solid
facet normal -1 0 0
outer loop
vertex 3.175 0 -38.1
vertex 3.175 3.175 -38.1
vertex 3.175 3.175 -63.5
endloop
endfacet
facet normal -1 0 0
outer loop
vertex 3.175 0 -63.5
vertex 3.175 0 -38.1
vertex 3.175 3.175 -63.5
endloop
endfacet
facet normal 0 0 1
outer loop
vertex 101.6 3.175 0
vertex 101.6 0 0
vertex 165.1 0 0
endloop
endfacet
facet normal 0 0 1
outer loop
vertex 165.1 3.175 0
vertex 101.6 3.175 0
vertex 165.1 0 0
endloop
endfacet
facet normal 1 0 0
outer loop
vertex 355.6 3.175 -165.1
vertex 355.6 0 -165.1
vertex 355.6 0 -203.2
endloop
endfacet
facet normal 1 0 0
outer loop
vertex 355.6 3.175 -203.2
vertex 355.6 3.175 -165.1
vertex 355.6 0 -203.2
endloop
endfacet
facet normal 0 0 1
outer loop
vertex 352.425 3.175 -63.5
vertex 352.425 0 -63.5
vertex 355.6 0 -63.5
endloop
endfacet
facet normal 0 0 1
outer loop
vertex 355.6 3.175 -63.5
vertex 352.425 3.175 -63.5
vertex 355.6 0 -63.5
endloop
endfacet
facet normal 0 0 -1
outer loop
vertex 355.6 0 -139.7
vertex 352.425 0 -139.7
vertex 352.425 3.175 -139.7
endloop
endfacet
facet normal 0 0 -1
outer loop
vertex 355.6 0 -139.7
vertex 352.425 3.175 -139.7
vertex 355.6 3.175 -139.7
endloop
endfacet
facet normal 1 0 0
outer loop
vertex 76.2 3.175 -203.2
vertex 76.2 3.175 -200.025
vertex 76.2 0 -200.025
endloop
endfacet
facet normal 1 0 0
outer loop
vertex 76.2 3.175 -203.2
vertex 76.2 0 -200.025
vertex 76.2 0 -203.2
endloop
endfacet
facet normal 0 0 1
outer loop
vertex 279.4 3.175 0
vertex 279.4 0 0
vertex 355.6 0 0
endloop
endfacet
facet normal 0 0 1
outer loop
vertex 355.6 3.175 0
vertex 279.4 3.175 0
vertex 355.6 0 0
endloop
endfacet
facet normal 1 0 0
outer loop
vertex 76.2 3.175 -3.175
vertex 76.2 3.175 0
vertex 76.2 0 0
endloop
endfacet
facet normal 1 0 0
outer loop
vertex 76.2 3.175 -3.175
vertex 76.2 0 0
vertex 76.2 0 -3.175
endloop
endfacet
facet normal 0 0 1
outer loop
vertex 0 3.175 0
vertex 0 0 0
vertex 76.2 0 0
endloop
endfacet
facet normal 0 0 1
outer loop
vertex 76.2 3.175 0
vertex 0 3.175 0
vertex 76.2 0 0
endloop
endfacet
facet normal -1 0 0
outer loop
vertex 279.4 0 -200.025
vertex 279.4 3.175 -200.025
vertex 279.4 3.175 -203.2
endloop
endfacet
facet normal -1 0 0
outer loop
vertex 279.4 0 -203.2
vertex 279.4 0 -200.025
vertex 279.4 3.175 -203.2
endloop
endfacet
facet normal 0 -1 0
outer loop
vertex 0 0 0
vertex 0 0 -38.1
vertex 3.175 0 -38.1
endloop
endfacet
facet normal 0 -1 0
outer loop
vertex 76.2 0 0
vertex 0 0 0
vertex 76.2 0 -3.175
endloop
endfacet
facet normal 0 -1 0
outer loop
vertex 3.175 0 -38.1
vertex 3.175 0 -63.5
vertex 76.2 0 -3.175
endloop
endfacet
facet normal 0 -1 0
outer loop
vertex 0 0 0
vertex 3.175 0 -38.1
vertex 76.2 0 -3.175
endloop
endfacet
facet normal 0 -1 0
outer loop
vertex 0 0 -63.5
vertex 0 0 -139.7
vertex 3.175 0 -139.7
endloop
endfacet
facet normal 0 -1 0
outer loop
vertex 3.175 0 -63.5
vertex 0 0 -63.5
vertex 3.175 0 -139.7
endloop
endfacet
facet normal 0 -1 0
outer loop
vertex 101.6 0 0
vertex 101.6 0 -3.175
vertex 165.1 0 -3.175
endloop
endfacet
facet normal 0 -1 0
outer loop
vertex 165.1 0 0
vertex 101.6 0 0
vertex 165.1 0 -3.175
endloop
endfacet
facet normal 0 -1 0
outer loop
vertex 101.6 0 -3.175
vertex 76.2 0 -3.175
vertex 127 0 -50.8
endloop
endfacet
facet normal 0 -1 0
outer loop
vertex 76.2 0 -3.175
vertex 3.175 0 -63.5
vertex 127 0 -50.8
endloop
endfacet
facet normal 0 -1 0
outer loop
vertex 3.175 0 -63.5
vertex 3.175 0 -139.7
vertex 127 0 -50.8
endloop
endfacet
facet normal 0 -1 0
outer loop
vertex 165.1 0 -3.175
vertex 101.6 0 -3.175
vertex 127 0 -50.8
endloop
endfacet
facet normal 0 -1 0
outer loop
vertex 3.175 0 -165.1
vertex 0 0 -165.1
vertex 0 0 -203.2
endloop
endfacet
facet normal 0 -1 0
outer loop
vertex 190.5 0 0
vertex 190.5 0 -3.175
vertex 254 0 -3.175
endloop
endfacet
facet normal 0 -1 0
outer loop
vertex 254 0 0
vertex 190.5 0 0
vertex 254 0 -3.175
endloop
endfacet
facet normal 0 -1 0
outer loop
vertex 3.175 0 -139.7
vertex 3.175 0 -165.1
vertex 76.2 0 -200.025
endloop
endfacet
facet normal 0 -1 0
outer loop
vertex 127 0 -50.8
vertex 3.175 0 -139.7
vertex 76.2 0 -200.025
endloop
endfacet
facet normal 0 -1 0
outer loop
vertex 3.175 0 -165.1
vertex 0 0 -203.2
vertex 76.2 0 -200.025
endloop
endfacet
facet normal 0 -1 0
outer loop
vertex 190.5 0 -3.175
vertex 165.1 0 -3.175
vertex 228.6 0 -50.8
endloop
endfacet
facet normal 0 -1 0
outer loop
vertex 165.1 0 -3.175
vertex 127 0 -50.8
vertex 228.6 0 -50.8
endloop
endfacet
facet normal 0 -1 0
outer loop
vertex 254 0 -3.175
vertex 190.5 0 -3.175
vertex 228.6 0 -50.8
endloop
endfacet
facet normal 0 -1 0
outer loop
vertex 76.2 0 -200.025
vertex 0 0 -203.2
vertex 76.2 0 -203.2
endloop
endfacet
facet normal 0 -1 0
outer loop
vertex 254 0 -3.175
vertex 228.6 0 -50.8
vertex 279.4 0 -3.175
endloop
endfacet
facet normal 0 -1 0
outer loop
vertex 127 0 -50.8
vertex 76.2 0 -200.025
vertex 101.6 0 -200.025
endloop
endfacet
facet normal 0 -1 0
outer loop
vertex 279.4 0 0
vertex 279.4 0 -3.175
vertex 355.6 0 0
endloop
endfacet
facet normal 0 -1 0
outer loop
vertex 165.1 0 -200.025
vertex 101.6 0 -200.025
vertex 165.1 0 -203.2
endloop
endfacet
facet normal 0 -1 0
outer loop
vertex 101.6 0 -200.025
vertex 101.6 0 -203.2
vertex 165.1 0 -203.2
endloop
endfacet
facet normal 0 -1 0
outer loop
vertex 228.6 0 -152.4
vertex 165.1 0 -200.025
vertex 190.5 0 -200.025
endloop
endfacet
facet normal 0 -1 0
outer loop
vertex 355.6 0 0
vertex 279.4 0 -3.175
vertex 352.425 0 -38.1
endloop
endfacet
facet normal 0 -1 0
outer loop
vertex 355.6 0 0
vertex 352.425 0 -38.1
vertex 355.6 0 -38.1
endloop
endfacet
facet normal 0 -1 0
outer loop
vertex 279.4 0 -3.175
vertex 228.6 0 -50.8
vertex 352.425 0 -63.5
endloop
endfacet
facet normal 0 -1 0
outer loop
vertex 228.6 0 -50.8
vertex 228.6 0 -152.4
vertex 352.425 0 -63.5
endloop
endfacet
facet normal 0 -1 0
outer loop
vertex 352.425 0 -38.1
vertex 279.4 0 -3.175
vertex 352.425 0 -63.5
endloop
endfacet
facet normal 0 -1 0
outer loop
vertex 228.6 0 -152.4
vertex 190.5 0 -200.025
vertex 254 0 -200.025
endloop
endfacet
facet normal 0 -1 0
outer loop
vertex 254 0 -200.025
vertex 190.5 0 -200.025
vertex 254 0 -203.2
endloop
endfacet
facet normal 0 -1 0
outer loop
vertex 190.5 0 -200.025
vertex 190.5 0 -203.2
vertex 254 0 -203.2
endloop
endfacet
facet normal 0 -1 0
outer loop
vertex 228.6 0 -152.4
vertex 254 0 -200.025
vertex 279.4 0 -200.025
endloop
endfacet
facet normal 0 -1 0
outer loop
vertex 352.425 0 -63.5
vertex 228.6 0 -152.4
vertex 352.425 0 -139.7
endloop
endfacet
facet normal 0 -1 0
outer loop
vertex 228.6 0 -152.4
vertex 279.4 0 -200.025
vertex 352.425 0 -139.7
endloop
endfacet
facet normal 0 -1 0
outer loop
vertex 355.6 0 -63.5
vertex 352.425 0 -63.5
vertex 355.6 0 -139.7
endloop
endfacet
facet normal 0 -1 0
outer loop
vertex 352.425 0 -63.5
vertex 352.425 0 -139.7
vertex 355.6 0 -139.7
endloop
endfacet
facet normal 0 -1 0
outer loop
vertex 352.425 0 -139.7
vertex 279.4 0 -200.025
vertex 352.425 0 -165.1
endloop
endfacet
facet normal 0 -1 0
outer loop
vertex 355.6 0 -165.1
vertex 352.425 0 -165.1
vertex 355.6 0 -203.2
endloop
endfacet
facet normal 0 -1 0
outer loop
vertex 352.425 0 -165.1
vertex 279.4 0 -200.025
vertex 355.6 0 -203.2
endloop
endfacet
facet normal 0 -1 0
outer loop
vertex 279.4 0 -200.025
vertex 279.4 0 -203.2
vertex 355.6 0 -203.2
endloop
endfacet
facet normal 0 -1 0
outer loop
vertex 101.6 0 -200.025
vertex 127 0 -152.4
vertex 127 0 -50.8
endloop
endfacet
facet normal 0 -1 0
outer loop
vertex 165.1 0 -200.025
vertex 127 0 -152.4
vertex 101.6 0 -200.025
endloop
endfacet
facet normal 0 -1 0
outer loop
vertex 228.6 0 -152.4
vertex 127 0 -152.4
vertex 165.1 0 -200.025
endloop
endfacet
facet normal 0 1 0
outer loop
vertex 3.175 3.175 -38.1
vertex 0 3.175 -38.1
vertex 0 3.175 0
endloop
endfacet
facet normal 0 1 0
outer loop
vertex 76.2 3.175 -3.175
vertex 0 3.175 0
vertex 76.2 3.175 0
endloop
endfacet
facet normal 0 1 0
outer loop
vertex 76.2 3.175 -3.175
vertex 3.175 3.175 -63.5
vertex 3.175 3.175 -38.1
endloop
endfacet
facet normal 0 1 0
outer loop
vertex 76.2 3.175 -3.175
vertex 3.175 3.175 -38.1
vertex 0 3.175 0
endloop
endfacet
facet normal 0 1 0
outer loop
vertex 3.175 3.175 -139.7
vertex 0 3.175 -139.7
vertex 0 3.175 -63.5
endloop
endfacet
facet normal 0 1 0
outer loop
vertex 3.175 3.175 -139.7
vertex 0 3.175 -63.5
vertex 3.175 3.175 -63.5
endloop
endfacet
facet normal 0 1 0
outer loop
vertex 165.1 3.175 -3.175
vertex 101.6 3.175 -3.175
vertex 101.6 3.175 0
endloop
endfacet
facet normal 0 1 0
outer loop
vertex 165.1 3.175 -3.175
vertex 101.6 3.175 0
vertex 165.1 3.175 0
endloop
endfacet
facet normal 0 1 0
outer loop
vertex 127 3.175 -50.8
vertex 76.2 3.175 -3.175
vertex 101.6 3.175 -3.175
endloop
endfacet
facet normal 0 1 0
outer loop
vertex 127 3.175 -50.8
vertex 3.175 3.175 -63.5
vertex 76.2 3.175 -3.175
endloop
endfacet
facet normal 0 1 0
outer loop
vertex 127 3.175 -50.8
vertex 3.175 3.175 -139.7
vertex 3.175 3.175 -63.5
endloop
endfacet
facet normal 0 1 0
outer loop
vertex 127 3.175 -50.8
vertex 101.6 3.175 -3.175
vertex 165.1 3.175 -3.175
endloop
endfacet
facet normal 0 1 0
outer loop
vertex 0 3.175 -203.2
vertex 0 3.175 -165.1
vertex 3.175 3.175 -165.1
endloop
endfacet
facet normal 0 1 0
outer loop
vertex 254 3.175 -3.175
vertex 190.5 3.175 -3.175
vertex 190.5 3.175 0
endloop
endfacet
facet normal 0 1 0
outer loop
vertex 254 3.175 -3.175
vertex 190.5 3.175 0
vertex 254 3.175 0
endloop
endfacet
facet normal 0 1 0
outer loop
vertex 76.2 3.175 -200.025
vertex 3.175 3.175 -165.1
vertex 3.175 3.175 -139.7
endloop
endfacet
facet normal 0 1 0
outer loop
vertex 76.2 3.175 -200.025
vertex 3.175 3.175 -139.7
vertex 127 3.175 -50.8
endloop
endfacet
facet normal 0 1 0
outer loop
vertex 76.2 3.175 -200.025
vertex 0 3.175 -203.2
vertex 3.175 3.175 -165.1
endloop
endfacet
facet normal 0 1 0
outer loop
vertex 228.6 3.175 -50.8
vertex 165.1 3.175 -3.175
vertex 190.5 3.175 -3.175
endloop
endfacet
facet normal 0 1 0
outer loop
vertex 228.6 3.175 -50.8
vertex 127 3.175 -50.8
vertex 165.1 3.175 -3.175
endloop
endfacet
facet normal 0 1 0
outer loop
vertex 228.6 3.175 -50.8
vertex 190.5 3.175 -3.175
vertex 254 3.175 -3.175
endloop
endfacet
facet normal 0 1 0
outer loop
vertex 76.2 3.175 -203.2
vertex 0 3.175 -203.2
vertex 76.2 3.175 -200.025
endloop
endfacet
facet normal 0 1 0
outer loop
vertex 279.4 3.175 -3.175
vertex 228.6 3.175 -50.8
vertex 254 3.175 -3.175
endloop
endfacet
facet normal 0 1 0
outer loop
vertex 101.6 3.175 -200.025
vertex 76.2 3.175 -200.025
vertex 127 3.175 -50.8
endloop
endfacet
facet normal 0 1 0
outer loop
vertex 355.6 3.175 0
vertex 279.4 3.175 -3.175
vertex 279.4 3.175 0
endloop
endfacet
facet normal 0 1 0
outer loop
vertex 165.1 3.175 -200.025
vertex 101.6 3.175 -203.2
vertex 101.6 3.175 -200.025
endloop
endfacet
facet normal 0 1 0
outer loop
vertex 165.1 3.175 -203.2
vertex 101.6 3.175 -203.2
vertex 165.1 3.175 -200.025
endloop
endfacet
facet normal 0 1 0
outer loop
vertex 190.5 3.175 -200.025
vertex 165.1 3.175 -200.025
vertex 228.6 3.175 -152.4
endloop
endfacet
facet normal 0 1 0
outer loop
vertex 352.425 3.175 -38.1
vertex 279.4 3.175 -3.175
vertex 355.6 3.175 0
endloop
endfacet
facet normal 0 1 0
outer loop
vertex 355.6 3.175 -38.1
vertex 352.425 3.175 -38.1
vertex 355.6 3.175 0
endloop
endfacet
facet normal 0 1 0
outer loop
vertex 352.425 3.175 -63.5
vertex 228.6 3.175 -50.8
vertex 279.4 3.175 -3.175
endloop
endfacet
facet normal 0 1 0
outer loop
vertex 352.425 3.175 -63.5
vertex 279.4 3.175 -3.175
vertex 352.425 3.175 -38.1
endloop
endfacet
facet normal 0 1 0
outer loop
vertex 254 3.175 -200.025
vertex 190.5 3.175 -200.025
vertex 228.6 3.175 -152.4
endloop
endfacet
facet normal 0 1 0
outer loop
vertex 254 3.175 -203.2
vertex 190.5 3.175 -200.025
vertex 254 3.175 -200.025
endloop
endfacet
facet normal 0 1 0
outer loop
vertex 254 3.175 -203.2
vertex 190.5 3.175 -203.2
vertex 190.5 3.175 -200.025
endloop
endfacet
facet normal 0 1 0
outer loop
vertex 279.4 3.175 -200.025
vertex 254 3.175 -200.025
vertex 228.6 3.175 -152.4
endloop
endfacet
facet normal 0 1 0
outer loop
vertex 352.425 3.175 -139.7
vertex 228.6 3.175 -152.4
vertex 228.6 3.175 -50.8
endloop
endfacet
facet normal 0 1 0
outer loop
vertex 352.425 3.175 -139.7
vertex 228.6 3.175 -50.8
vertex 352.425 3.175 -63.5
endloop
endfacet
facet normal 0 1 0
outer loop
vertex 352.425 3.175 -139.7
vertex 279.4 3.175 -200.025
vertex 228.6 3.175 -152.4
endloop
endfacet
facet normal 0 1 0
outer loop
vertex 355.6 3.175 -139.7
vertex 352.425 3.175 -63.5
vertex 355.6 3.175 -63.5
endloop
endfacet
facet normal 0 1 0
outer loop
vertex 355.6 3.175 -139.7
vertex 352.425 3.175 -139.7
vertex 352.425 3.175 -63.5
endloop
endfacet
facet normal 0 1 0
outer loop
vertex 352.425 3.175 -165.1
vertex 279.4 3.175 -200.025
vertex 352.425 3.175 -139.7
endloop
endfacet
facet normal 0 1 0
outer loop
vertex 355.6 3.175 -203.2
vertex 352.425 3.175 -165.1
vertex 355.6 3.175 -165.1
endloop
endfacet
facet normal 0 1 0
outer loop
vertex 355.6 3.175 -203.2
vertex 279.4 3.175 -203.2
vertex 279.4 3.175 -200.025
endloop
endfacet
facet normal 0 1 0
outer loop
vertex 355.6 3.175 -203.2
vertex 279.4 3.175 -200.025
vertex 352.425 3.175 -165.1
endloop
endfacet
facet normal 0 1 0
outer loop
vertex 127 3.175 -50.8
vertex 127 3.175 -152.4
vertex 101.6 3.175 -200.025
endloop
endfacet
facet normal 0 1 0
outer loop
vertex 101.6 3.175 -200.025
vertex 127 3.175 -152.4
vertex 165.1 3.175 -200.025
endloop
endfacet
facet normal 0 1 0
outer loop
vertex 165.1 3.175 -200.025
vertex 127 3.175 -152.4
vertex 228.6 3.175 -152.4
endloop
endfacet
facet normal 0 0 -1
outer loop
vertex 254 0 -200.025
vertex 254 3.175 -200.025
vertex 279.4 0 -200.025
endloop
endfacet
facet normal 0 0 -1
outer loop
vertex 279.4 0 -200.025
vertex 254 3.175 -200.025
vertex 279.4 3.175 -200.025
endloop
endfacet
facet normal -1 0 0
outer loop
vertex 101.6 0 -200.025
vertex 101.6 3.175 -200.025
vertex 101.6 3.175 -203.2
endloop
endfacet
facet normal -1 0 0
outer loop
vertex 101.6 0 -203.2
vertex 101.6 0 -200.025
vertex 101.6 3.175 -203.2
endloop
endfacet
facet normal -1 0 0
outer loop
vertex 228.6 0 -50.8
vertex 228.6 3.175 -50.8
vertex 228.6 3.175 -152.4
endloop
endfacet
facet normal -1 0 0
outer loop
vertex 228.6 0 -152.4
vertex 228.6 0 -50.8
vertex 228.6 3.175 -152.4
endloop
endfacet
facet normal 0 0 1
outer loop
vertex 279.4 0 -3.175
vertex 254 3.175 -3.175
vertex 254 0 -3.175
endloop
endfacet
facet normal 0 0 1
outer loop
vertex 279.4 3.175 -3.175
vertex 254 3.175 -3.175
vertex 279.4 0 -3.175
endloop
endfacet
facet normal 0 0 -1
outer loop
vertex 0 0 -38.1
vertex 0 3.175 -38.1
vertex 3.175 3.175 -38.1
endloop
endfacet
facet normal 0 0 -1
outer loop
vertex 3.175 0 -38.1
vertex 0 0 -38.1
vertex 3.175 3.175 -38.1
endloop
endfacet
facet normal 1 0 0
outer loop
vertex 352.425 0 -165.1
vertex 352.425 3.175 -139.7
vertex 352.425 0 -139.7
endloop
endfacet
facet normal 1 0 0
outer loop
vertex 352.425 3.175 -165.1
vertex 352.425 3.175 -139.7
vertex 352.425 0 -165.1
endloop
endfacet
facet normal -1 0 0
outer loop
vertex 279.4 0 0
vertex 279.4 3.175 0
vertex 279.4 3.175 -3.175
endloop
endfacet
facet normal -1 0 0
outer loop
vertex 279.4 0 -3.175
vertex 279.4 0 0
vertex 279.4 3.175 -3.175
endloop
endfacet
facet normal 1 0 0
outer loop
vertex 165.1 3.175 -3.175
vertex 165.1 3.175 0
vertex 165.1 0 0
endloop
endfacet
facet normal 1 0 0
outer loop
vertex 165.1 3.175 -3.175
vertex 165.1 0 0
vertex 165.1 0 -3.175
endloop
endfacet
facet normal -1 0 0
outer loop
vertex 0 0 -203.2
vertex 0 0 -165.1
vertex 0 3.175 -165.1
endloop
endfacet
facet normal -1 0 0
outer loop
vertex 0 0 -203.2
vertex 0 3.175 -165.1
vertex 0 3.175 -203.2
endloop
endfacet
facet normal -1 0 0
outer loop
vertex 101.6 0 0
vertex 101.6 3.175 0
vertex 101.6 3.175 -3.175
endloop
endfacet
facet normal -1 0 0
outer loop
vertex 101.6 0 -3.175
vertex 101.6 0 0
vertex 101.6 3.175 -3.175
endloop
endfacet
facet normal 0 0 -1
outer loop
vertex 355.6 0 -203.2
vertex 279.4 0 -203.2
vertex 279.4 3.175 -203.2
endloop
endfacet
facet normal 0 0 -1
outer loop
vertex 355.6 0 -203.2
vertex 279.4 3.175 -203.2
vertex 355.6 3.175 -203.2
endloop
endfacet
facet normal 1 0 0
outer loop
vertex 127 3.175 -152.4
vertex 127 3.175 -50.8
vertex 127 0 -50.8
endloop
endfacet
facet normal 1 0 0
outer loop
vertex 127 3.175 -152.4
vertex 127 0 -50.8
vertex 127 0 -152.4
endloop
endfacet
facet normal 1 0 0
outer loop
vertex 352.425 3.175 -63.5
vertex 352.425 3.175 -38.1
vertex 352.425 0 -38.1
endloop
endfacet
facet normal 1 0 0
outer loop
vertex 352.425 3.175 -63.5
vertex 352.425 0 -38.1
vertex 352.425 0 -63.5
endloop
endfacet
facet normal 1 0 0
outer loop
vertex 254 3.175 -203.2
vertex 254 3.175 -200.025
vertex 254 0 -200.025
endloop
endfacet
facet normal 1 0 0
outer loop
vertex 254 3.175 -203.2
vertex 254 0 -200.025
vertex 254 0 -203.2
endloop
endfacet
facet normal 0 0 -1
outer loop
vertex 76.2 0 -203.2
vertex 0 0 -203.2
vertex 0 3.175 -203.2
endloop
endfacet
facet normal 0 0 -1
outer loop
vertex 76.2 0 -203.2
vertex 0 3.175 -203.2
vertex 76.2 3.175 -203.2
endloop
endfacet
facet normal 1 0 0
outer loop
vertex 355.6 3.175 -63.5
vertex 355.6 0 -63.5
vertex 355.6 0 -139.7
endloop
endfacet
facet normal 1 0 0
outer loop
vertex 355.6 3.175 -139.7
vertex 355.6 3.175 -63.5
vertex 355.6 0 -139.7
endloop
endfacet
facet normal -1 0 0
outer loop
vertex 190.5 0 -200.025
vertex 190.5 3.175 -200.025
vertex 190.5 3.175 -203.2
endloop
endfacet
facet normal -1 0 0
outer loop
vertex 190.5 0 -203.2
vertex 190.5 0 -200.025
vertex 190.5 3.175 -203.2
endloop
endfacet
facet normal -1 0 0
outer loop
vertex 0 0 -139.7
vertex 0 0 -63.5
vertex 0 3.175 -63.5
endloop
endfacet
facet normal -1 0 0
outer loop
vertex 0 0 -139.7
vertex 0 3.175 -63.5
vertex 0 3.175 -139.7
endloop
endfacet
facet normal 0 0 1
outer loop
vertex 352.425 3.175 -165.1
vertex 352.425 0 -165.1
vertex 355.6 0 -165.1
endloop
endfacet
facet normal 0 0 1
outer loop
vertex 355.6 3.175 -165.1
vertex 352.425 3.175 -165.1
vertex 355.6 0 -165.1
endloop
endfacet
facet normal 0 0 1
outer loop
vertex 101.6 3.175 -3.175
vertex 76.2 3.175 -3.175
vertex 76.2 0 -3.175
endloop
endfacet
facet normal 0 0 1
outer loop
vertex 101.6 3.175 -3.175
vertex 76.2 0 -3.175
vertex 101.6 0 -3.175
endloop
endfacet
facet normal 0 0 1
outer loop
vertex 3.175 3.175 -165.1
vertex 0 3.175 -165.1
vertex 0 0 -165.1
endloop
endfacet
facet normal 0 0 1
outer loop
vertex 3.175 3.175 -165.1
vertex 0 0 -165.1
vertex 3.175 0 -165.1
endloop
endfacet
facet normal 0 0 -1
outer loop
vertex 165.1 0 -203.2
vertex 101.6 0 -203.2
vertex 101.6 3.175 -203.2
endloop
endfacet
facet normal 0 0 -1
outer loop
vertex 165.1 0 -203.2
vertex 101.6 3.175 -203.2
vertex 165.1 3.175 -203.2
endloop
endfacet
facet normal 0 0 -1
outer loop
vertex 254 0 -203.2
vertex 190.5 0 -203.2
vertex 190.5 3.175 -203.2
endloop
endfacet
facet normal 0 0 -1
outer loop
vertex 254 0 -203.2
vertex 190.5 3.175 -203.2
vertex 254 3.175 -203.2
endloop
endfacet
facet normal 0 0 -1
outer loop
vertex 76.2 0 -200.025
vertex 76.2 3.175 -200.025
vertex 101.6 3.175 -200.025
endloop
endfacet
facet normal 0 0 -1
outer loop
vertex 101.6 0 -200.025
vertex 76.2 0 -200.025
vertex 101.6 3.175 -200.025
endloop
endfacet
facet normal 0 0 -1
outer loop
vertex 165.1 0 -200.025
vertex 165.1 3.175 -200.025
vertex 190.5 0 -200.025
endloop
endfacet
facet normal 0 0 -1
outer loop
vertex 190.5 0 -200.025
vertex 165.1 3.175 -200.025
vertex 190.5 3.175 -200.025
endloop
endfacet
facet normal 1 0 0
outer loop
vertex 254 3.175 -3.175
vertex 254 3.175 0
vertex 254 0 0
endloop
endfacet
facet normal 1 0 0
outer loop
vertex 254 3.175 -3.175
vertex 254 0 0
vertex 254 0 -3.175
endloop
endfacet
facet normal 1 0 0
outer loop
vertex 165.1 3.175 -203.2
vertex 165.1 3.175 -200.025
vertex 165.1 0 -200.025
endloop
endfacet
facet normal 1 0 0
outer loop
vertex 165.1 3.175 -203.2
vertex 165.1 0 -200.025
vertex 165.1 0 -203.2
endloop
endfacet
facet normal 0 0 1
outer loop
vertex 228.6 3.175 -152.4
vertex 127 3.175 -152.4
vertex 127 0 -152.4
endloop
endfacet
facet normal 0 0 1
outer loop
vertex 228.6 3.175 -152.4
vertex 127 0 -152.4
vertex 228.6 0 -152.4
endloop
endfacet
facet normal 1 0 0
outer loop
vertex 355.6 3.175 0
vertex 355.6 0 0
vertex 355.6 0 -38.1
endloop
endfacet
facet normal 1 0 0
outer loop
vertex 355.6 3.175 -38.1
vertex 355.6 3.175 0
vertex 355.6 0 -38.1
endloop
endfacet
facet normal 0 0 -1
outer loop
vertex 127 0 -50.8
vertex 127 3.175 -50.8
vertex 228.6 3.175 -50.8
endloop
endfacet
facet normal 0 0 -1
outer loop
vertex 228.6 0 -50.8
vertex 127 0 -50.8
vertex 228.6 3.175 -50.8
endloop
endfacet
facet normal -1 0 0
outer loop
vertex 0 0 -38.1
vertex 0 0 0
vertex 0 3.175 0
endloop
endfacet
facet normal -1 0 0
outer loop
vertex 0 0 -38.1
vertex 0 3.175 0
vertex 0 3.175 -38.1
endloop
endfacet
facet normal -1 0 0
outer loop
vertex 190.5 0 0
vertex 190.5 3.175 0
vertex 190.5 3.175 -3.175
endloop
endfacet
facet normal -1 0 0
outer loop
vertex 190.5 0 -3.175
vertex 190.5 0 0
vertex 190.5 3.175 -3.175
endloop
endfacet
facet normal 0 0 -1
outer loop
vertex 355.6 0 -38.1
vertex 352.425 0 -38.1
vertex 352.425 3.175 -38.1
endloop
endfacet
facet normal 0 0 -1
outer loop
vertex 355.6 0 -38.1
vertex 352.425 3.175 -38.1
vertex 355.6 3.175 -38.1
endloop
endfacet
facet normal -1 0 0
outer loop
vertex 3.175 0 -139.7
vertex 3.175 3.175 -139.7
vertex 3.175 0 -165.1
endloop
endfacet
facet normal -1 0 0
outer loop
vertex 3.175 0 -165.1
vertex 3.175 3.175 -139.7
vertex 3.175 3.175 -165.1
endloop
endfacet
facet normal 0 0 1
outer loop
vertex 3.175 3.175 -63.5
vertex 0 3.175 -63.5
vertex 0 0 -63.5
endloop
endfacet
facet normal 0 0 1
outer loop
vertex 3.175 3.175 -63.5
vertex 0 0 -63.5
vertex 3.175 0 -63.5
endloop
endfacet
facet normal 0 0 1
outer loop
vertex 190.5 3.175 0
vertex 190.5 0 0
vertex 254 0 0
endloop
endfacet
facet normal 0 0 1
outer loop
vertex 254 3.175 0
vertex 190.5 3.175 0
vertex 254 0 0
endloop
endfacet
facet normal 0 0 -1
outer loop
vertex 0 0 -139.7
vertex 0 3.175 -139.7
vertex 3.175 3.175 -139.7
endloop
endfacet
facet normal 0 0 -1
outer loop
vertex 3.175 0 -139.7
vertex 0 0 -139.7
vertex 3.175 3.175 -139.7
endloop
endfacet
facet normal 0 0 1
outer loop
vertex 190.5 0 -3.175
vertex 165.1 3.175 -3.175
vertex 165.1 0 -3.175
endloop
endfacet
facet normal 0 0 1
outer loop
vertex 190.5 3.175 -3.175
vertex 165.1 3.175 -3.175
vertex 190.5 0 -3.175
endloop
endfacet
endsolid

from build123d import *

# Parameters (mm, degrees)
SKETCH1_W           = 355.6
SKETCH1_H           = 203.2
BOSS_EXTRUDE1_DEPTH = 3.175
SKETCH2_W           = 101.6
SKETCH2_H           = 101.6
CUT_EXTRUDE1_DEPTH  = 4.175
SKETCH4_W           = 25.4
SKETCH4_H           = 3.175
SKETCH4_W_2         = 3.175
SKETCH4_H_2         = 25.4
CUT_EXTRUDE3_DEPTH  = 4.175


with BuildPart() as part:
    # Sketch1 → Boss-Extrude1 (new body)
    with BuildSketch(Plane(origin=(0, 0, 0), x_dir=(1, 0, 0), z_dir=(0, 1, 0))):
        with Locations((177.8, 101.6)):
            Rectangle(SKETCH1_W, SKETCH1_H)
    extrude(amount=BOSS_EXTRUDE1_DEPTH)

    # Sketch2 → Cut-Extrude1 (cut, through all)
    with BuildSketch(Plane(origin=(0, 3.175, 0), x_dir=(1, 0, 0), z_dir=(0, 1, 0))):
        with Locations((177.8, 101.6)):
            Rectangle(SKETCH2_W, SKETCH2_H)
    extrude(amount=-CUT_EXTRUDE1_DEPTH, mode=Mode.SUBTRACT)

    # Sketch4 → Cut-Extrude3 (cut, through all)
    with BuildSketch(Plane(origin=(0, 3.175, 0), x_dir=(1, 0, 0), z_dir=(0, 1, 0))):
        with Locations((88.9, 1.5875)):
            Rectangle(SKETCH4_W, SKETCH4_H)
        with Locations((177.8, 1.5875)):
            Rectangle(SKETCH4_W, SKETCH4_H)
        with Locations((266.7, 1.5875)):
            Rectangle(SKETCH4_W, SKETCH4_H)
        with Locations((266.7, 201.6125)):
            Rectangle(SKETCH4_W, SKETCH4_H)
        with Locations((177.8, 201.6125)):
            Rectangle(SKETCH4_W, SKETCH4_H)
        with Locations((88.9, 201.6125)):
            Rectangle(SKETCH4_W, SKETCH4_H)
        with Locations((1.5875, 152.4)):
            Rectangle(SKETCH4_W_2, SKETCH4_H_2)
        with Locations((1.5875, 50.8)):
            Rectangle(SKETCH4_W_2, SKETCH4_H_2)
        with Locations((354.0125, 50.8)):
            Rectangle(SKETCH4_W_2, SKETCH4_H_2)
        with Locations((354.0125, 152.4)):
            Rectangle(SKETCH4_W_2, SKETCH4_H_2)
    extrude(amount=-CUT_EXTRUDE3_DEPTH, mode=Mode.SUBTRACT)


solid = part.part
